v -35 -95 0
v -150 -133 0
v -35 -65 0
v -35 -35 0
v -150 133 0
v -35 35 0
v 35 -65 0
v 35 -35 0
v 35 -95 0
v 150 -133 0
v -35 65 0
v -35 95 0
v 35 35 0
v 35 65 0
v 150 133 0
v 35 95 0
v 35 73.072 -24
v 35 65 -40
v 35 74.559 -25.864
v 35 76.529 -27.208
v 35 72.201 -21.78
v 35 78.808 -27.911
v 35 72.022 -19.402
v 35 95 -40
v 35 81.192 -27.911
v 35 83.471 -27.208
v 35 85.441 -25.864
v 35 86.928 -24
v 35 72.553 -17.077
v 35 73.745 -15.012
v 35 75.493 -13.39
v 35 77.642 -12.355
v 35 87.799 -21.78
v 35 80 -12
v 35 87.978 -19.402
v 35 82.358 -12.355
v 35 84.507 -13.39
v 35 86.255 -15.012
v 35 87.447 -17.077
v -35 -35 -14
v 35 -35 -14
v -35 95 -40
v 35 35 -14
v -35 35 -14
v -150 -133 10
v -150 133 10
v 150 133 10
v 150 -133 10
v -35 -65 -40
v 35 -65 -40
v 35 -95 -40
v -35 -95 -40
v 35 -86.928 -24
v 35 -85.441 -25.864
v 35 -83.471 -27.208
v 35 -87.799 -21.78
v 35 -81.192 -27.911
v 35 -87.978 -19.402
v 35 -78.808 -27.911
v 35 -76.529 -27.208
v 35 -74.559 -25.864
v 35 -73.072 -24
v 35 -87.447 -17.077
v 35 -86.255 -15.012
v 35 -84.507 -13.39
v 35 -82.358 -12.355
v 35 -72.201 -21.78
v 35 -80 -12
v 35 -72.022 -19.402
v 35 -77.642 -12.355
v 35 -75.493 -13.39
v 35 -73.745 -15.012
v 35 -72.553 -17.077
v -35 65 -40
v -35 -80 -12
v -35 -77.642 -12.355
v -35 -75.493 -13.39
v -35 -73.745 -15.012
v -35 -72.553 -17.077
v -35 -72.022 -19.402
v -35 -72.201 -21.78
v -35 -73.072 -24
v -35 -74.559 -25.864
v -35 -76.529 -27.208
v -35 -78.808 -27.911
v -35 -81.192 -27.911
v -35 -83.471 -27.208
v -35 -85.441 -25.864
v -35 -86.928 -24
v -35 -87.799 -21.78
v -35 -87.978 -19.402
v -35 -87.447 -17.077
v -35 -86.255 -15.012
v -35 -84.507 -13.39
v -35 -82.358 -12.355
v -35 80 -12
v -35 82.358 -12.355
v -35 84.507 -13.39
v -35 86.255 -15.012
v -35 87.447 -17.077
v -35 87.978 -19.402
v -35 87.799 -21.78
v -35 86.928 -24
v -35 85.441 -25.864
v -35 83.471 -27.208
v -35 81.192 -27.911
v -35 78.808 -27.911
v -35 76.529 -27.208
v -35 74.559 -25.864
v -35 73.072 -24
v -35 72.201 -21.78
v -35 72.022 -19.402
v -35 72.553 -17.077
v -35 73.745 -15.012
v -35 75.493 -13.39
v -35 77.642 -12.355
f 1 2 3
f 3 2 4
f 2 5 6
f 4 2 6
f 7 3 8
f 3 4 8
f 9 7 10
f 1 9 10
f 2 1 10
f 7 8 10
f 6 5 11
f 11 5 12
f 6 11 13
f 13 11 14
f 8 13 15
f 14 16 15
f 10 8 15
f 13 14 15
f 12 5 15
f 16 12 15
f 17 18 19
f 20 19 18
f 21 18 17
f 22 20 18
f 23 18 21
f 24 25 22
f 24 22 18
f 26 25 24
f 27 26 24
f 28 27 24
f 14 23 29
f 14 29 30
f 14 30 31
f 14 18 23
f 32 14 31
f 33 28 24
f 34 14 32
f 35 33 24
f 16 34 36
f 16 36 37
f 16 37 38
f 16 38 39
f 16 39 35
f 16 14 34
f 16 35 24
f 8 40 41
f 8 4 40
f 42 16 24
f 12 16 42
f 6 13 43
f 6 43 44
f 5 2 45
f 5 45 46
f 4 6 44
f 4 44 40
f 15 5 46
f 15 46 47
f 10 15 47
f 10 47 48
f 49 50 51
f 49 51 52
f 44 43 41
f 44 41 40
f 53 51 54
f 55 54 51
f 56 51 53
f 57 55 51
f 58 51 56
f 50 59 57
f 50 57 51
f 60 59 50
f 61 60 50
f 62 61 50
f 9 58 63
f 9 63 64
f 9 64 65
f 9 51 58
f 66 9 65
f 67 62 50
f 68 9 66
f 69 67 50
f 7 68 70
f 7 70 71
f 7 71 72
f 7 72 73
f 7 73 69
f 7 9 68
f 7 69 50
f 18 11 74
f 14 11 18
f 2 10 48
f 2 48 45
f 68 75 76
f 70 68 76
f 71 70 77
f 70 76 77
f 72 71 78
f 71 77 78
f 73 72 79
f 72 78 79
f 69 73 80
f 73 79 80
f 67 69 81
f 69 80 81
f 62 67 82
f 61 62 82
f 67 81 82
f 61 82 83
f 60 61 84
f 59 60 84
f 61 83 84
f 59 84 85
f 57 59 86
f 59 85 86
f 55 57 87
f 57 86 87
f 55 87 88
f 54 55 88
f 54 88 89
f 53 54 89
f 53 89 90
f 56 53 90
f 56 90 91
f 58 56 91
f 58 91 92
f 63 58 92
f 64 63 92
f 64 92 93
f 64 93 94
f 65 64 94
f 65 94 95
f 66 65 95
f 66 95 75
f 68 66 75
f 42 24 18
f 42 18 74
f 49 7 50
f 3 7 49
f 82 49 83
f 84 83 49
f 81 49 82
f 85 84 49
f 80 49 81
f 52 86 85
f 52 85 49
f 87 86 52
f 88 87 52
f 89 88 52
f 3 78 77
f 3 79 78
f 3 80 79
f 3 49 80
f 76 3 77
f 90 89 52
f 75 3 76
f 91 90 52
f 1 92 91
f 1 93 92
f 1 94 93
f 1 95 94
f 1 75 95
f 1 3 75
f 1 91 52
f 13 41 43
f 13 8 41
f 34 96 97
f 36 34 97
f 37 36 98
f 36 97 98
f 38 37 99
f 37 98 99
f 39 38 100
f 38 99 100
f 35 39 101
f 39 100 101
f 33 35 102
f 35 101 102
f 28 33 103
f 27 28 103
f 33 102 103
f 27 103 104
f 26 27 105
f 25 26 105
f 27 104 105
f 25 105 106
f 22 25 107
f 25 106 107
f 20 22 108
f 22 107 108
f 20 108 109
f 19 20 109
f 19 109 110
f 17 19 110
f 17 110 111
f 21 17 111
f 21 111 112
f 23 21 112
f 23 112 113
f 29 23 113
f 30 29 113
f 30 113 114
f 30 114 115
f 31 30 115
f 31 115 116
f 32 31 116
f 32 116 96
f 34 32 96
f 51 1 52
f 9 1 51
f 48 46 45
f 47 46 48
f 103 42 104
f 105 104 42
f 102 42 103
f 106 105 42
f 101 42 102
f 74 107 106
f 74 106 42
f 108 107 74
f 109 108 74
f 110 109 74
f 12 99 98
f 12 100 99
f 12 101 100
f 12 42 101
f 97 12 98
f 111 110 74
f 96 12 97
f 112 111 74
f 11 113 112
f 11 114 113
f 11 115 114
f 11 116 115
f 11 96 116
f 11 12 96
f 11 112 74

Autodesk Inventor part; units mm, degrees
ref_plane "YZ Plane" through (0, 0, 0) normal (1, 0, 0) x (0, 1, 0)
ref_plane "XZ Plane" through (0, 0, 0) normal (0, 1, 0) x (-1, 0, 0)
ref_plane "XY Plane" through (0, 0, 0) normal (0, 0, 1) x (1, 0, 0)
sketch "Sketch1" plane through (0, 0, 0) normal (0, 0, 1) x (1, 0, 0)
  line L0 (150, -133) -> (-150, -133)
  line L1 (-150, -133) -> (-150, 133)
  line L2 (-150, 133) -> (150, 133)
  line L3 (150, 133) -> (150, -133)
  line L4 (0, 0) -> (0, 81.3474)
  line L5 (0, 0) -> (80.8517, 0)
  point P0 (0, 133)
  point P1 (150, 0)
  dimension "d0" = 300
  dimension "d1" = 266
extrude "Extrusion1" add sketch "Sketch1" along normal blind 10
sketch "Sketch2" plane through (0, 0, 0) normal (0, 0, -1) x (-1, 0, 0)
  line L0 (35, -35) -> (-35, -35)
  line L1 (-35, -35) -> (-35, 35)
  line L2 (-35, 35) -> (35, 35)
  line L3 (35, 35) -> (35, -35)
  line L4 (0, 0) -> (0, 15.9444)
  line L5 (0, 0) -> (16.1389, 0)
  line L6 (35, -95) -> (-35, -95)
  line L7 (-35, -95) -> (-35, -65)
  line L8 (-35, -65) -> (35, -65)
  line L9 (35, -65) -> (35, -95)
  line L10 (35, 65) -> (-35, 65)
  line L11 (-35, 65) -> (-35, 95)
  line L12 (-35, 95) -> (35, 95)
  line L13 (35, 95) -> (35, 65)
  point P0 (0, 35)
  point P1 (35, 0)
  dimension "d4" = 70
  dimension "d7" = 70
  dimension "d8" = 30
  dimension "d9" = 30
  dimension "d10" = 30
  dimension "d11" = 30
extrude "Extrusion2" add sketch "Sketch2" along normal blind 14 contours L0 L1 L2 L3
extrude "Extrusion3" add sketch "Sketch2" along normal blind 40 contours L6 L7 L8 L9 | L10 L11 L12 L13
sketch "Sketch3" plane through (-35, 65, 0) normal (-1, 0, 0) x (0, 0, 1)
  line L0 (0, 30) -> (-40, 30) projected
  line L1 (-40, 0) -> (-40, 30) projected
  circle A0 centre (-20, 15) radius 8
  point P0 (0, -65)
  dimension "d14" = 16
  dimension "d15" = 15
  dimension "d16" = 20
extrude "Extrusion4" cut sketch "Sketch3" against normal through all
sketch "Sketch4" plane through (-35, -95, 0) normal (-1, 0, 0) x (0, 0, 1)
  line L0 (0, 30) -> (-40, 30) projected
  line L1 (-40, 0) -> (-40, 30) projected
  circle A0 centre (-20, 15) radius 8
  point P0 (0, 95)
  dimension "d19" = 16
  dimension "d20" = 15
  dimension "d21" = 20
extrude "Extrusion5" cut sketch "Sketch4" against normal through all
thread "Thread1" size "M16x2" class "6H" standard "ANSI Metric M Profile" full length
thread "Thread2" size "M16x2" class "6H" standard "ANSI Metric M Profile" full length
properties part number "Plate" material "Wood (Walnut)"
